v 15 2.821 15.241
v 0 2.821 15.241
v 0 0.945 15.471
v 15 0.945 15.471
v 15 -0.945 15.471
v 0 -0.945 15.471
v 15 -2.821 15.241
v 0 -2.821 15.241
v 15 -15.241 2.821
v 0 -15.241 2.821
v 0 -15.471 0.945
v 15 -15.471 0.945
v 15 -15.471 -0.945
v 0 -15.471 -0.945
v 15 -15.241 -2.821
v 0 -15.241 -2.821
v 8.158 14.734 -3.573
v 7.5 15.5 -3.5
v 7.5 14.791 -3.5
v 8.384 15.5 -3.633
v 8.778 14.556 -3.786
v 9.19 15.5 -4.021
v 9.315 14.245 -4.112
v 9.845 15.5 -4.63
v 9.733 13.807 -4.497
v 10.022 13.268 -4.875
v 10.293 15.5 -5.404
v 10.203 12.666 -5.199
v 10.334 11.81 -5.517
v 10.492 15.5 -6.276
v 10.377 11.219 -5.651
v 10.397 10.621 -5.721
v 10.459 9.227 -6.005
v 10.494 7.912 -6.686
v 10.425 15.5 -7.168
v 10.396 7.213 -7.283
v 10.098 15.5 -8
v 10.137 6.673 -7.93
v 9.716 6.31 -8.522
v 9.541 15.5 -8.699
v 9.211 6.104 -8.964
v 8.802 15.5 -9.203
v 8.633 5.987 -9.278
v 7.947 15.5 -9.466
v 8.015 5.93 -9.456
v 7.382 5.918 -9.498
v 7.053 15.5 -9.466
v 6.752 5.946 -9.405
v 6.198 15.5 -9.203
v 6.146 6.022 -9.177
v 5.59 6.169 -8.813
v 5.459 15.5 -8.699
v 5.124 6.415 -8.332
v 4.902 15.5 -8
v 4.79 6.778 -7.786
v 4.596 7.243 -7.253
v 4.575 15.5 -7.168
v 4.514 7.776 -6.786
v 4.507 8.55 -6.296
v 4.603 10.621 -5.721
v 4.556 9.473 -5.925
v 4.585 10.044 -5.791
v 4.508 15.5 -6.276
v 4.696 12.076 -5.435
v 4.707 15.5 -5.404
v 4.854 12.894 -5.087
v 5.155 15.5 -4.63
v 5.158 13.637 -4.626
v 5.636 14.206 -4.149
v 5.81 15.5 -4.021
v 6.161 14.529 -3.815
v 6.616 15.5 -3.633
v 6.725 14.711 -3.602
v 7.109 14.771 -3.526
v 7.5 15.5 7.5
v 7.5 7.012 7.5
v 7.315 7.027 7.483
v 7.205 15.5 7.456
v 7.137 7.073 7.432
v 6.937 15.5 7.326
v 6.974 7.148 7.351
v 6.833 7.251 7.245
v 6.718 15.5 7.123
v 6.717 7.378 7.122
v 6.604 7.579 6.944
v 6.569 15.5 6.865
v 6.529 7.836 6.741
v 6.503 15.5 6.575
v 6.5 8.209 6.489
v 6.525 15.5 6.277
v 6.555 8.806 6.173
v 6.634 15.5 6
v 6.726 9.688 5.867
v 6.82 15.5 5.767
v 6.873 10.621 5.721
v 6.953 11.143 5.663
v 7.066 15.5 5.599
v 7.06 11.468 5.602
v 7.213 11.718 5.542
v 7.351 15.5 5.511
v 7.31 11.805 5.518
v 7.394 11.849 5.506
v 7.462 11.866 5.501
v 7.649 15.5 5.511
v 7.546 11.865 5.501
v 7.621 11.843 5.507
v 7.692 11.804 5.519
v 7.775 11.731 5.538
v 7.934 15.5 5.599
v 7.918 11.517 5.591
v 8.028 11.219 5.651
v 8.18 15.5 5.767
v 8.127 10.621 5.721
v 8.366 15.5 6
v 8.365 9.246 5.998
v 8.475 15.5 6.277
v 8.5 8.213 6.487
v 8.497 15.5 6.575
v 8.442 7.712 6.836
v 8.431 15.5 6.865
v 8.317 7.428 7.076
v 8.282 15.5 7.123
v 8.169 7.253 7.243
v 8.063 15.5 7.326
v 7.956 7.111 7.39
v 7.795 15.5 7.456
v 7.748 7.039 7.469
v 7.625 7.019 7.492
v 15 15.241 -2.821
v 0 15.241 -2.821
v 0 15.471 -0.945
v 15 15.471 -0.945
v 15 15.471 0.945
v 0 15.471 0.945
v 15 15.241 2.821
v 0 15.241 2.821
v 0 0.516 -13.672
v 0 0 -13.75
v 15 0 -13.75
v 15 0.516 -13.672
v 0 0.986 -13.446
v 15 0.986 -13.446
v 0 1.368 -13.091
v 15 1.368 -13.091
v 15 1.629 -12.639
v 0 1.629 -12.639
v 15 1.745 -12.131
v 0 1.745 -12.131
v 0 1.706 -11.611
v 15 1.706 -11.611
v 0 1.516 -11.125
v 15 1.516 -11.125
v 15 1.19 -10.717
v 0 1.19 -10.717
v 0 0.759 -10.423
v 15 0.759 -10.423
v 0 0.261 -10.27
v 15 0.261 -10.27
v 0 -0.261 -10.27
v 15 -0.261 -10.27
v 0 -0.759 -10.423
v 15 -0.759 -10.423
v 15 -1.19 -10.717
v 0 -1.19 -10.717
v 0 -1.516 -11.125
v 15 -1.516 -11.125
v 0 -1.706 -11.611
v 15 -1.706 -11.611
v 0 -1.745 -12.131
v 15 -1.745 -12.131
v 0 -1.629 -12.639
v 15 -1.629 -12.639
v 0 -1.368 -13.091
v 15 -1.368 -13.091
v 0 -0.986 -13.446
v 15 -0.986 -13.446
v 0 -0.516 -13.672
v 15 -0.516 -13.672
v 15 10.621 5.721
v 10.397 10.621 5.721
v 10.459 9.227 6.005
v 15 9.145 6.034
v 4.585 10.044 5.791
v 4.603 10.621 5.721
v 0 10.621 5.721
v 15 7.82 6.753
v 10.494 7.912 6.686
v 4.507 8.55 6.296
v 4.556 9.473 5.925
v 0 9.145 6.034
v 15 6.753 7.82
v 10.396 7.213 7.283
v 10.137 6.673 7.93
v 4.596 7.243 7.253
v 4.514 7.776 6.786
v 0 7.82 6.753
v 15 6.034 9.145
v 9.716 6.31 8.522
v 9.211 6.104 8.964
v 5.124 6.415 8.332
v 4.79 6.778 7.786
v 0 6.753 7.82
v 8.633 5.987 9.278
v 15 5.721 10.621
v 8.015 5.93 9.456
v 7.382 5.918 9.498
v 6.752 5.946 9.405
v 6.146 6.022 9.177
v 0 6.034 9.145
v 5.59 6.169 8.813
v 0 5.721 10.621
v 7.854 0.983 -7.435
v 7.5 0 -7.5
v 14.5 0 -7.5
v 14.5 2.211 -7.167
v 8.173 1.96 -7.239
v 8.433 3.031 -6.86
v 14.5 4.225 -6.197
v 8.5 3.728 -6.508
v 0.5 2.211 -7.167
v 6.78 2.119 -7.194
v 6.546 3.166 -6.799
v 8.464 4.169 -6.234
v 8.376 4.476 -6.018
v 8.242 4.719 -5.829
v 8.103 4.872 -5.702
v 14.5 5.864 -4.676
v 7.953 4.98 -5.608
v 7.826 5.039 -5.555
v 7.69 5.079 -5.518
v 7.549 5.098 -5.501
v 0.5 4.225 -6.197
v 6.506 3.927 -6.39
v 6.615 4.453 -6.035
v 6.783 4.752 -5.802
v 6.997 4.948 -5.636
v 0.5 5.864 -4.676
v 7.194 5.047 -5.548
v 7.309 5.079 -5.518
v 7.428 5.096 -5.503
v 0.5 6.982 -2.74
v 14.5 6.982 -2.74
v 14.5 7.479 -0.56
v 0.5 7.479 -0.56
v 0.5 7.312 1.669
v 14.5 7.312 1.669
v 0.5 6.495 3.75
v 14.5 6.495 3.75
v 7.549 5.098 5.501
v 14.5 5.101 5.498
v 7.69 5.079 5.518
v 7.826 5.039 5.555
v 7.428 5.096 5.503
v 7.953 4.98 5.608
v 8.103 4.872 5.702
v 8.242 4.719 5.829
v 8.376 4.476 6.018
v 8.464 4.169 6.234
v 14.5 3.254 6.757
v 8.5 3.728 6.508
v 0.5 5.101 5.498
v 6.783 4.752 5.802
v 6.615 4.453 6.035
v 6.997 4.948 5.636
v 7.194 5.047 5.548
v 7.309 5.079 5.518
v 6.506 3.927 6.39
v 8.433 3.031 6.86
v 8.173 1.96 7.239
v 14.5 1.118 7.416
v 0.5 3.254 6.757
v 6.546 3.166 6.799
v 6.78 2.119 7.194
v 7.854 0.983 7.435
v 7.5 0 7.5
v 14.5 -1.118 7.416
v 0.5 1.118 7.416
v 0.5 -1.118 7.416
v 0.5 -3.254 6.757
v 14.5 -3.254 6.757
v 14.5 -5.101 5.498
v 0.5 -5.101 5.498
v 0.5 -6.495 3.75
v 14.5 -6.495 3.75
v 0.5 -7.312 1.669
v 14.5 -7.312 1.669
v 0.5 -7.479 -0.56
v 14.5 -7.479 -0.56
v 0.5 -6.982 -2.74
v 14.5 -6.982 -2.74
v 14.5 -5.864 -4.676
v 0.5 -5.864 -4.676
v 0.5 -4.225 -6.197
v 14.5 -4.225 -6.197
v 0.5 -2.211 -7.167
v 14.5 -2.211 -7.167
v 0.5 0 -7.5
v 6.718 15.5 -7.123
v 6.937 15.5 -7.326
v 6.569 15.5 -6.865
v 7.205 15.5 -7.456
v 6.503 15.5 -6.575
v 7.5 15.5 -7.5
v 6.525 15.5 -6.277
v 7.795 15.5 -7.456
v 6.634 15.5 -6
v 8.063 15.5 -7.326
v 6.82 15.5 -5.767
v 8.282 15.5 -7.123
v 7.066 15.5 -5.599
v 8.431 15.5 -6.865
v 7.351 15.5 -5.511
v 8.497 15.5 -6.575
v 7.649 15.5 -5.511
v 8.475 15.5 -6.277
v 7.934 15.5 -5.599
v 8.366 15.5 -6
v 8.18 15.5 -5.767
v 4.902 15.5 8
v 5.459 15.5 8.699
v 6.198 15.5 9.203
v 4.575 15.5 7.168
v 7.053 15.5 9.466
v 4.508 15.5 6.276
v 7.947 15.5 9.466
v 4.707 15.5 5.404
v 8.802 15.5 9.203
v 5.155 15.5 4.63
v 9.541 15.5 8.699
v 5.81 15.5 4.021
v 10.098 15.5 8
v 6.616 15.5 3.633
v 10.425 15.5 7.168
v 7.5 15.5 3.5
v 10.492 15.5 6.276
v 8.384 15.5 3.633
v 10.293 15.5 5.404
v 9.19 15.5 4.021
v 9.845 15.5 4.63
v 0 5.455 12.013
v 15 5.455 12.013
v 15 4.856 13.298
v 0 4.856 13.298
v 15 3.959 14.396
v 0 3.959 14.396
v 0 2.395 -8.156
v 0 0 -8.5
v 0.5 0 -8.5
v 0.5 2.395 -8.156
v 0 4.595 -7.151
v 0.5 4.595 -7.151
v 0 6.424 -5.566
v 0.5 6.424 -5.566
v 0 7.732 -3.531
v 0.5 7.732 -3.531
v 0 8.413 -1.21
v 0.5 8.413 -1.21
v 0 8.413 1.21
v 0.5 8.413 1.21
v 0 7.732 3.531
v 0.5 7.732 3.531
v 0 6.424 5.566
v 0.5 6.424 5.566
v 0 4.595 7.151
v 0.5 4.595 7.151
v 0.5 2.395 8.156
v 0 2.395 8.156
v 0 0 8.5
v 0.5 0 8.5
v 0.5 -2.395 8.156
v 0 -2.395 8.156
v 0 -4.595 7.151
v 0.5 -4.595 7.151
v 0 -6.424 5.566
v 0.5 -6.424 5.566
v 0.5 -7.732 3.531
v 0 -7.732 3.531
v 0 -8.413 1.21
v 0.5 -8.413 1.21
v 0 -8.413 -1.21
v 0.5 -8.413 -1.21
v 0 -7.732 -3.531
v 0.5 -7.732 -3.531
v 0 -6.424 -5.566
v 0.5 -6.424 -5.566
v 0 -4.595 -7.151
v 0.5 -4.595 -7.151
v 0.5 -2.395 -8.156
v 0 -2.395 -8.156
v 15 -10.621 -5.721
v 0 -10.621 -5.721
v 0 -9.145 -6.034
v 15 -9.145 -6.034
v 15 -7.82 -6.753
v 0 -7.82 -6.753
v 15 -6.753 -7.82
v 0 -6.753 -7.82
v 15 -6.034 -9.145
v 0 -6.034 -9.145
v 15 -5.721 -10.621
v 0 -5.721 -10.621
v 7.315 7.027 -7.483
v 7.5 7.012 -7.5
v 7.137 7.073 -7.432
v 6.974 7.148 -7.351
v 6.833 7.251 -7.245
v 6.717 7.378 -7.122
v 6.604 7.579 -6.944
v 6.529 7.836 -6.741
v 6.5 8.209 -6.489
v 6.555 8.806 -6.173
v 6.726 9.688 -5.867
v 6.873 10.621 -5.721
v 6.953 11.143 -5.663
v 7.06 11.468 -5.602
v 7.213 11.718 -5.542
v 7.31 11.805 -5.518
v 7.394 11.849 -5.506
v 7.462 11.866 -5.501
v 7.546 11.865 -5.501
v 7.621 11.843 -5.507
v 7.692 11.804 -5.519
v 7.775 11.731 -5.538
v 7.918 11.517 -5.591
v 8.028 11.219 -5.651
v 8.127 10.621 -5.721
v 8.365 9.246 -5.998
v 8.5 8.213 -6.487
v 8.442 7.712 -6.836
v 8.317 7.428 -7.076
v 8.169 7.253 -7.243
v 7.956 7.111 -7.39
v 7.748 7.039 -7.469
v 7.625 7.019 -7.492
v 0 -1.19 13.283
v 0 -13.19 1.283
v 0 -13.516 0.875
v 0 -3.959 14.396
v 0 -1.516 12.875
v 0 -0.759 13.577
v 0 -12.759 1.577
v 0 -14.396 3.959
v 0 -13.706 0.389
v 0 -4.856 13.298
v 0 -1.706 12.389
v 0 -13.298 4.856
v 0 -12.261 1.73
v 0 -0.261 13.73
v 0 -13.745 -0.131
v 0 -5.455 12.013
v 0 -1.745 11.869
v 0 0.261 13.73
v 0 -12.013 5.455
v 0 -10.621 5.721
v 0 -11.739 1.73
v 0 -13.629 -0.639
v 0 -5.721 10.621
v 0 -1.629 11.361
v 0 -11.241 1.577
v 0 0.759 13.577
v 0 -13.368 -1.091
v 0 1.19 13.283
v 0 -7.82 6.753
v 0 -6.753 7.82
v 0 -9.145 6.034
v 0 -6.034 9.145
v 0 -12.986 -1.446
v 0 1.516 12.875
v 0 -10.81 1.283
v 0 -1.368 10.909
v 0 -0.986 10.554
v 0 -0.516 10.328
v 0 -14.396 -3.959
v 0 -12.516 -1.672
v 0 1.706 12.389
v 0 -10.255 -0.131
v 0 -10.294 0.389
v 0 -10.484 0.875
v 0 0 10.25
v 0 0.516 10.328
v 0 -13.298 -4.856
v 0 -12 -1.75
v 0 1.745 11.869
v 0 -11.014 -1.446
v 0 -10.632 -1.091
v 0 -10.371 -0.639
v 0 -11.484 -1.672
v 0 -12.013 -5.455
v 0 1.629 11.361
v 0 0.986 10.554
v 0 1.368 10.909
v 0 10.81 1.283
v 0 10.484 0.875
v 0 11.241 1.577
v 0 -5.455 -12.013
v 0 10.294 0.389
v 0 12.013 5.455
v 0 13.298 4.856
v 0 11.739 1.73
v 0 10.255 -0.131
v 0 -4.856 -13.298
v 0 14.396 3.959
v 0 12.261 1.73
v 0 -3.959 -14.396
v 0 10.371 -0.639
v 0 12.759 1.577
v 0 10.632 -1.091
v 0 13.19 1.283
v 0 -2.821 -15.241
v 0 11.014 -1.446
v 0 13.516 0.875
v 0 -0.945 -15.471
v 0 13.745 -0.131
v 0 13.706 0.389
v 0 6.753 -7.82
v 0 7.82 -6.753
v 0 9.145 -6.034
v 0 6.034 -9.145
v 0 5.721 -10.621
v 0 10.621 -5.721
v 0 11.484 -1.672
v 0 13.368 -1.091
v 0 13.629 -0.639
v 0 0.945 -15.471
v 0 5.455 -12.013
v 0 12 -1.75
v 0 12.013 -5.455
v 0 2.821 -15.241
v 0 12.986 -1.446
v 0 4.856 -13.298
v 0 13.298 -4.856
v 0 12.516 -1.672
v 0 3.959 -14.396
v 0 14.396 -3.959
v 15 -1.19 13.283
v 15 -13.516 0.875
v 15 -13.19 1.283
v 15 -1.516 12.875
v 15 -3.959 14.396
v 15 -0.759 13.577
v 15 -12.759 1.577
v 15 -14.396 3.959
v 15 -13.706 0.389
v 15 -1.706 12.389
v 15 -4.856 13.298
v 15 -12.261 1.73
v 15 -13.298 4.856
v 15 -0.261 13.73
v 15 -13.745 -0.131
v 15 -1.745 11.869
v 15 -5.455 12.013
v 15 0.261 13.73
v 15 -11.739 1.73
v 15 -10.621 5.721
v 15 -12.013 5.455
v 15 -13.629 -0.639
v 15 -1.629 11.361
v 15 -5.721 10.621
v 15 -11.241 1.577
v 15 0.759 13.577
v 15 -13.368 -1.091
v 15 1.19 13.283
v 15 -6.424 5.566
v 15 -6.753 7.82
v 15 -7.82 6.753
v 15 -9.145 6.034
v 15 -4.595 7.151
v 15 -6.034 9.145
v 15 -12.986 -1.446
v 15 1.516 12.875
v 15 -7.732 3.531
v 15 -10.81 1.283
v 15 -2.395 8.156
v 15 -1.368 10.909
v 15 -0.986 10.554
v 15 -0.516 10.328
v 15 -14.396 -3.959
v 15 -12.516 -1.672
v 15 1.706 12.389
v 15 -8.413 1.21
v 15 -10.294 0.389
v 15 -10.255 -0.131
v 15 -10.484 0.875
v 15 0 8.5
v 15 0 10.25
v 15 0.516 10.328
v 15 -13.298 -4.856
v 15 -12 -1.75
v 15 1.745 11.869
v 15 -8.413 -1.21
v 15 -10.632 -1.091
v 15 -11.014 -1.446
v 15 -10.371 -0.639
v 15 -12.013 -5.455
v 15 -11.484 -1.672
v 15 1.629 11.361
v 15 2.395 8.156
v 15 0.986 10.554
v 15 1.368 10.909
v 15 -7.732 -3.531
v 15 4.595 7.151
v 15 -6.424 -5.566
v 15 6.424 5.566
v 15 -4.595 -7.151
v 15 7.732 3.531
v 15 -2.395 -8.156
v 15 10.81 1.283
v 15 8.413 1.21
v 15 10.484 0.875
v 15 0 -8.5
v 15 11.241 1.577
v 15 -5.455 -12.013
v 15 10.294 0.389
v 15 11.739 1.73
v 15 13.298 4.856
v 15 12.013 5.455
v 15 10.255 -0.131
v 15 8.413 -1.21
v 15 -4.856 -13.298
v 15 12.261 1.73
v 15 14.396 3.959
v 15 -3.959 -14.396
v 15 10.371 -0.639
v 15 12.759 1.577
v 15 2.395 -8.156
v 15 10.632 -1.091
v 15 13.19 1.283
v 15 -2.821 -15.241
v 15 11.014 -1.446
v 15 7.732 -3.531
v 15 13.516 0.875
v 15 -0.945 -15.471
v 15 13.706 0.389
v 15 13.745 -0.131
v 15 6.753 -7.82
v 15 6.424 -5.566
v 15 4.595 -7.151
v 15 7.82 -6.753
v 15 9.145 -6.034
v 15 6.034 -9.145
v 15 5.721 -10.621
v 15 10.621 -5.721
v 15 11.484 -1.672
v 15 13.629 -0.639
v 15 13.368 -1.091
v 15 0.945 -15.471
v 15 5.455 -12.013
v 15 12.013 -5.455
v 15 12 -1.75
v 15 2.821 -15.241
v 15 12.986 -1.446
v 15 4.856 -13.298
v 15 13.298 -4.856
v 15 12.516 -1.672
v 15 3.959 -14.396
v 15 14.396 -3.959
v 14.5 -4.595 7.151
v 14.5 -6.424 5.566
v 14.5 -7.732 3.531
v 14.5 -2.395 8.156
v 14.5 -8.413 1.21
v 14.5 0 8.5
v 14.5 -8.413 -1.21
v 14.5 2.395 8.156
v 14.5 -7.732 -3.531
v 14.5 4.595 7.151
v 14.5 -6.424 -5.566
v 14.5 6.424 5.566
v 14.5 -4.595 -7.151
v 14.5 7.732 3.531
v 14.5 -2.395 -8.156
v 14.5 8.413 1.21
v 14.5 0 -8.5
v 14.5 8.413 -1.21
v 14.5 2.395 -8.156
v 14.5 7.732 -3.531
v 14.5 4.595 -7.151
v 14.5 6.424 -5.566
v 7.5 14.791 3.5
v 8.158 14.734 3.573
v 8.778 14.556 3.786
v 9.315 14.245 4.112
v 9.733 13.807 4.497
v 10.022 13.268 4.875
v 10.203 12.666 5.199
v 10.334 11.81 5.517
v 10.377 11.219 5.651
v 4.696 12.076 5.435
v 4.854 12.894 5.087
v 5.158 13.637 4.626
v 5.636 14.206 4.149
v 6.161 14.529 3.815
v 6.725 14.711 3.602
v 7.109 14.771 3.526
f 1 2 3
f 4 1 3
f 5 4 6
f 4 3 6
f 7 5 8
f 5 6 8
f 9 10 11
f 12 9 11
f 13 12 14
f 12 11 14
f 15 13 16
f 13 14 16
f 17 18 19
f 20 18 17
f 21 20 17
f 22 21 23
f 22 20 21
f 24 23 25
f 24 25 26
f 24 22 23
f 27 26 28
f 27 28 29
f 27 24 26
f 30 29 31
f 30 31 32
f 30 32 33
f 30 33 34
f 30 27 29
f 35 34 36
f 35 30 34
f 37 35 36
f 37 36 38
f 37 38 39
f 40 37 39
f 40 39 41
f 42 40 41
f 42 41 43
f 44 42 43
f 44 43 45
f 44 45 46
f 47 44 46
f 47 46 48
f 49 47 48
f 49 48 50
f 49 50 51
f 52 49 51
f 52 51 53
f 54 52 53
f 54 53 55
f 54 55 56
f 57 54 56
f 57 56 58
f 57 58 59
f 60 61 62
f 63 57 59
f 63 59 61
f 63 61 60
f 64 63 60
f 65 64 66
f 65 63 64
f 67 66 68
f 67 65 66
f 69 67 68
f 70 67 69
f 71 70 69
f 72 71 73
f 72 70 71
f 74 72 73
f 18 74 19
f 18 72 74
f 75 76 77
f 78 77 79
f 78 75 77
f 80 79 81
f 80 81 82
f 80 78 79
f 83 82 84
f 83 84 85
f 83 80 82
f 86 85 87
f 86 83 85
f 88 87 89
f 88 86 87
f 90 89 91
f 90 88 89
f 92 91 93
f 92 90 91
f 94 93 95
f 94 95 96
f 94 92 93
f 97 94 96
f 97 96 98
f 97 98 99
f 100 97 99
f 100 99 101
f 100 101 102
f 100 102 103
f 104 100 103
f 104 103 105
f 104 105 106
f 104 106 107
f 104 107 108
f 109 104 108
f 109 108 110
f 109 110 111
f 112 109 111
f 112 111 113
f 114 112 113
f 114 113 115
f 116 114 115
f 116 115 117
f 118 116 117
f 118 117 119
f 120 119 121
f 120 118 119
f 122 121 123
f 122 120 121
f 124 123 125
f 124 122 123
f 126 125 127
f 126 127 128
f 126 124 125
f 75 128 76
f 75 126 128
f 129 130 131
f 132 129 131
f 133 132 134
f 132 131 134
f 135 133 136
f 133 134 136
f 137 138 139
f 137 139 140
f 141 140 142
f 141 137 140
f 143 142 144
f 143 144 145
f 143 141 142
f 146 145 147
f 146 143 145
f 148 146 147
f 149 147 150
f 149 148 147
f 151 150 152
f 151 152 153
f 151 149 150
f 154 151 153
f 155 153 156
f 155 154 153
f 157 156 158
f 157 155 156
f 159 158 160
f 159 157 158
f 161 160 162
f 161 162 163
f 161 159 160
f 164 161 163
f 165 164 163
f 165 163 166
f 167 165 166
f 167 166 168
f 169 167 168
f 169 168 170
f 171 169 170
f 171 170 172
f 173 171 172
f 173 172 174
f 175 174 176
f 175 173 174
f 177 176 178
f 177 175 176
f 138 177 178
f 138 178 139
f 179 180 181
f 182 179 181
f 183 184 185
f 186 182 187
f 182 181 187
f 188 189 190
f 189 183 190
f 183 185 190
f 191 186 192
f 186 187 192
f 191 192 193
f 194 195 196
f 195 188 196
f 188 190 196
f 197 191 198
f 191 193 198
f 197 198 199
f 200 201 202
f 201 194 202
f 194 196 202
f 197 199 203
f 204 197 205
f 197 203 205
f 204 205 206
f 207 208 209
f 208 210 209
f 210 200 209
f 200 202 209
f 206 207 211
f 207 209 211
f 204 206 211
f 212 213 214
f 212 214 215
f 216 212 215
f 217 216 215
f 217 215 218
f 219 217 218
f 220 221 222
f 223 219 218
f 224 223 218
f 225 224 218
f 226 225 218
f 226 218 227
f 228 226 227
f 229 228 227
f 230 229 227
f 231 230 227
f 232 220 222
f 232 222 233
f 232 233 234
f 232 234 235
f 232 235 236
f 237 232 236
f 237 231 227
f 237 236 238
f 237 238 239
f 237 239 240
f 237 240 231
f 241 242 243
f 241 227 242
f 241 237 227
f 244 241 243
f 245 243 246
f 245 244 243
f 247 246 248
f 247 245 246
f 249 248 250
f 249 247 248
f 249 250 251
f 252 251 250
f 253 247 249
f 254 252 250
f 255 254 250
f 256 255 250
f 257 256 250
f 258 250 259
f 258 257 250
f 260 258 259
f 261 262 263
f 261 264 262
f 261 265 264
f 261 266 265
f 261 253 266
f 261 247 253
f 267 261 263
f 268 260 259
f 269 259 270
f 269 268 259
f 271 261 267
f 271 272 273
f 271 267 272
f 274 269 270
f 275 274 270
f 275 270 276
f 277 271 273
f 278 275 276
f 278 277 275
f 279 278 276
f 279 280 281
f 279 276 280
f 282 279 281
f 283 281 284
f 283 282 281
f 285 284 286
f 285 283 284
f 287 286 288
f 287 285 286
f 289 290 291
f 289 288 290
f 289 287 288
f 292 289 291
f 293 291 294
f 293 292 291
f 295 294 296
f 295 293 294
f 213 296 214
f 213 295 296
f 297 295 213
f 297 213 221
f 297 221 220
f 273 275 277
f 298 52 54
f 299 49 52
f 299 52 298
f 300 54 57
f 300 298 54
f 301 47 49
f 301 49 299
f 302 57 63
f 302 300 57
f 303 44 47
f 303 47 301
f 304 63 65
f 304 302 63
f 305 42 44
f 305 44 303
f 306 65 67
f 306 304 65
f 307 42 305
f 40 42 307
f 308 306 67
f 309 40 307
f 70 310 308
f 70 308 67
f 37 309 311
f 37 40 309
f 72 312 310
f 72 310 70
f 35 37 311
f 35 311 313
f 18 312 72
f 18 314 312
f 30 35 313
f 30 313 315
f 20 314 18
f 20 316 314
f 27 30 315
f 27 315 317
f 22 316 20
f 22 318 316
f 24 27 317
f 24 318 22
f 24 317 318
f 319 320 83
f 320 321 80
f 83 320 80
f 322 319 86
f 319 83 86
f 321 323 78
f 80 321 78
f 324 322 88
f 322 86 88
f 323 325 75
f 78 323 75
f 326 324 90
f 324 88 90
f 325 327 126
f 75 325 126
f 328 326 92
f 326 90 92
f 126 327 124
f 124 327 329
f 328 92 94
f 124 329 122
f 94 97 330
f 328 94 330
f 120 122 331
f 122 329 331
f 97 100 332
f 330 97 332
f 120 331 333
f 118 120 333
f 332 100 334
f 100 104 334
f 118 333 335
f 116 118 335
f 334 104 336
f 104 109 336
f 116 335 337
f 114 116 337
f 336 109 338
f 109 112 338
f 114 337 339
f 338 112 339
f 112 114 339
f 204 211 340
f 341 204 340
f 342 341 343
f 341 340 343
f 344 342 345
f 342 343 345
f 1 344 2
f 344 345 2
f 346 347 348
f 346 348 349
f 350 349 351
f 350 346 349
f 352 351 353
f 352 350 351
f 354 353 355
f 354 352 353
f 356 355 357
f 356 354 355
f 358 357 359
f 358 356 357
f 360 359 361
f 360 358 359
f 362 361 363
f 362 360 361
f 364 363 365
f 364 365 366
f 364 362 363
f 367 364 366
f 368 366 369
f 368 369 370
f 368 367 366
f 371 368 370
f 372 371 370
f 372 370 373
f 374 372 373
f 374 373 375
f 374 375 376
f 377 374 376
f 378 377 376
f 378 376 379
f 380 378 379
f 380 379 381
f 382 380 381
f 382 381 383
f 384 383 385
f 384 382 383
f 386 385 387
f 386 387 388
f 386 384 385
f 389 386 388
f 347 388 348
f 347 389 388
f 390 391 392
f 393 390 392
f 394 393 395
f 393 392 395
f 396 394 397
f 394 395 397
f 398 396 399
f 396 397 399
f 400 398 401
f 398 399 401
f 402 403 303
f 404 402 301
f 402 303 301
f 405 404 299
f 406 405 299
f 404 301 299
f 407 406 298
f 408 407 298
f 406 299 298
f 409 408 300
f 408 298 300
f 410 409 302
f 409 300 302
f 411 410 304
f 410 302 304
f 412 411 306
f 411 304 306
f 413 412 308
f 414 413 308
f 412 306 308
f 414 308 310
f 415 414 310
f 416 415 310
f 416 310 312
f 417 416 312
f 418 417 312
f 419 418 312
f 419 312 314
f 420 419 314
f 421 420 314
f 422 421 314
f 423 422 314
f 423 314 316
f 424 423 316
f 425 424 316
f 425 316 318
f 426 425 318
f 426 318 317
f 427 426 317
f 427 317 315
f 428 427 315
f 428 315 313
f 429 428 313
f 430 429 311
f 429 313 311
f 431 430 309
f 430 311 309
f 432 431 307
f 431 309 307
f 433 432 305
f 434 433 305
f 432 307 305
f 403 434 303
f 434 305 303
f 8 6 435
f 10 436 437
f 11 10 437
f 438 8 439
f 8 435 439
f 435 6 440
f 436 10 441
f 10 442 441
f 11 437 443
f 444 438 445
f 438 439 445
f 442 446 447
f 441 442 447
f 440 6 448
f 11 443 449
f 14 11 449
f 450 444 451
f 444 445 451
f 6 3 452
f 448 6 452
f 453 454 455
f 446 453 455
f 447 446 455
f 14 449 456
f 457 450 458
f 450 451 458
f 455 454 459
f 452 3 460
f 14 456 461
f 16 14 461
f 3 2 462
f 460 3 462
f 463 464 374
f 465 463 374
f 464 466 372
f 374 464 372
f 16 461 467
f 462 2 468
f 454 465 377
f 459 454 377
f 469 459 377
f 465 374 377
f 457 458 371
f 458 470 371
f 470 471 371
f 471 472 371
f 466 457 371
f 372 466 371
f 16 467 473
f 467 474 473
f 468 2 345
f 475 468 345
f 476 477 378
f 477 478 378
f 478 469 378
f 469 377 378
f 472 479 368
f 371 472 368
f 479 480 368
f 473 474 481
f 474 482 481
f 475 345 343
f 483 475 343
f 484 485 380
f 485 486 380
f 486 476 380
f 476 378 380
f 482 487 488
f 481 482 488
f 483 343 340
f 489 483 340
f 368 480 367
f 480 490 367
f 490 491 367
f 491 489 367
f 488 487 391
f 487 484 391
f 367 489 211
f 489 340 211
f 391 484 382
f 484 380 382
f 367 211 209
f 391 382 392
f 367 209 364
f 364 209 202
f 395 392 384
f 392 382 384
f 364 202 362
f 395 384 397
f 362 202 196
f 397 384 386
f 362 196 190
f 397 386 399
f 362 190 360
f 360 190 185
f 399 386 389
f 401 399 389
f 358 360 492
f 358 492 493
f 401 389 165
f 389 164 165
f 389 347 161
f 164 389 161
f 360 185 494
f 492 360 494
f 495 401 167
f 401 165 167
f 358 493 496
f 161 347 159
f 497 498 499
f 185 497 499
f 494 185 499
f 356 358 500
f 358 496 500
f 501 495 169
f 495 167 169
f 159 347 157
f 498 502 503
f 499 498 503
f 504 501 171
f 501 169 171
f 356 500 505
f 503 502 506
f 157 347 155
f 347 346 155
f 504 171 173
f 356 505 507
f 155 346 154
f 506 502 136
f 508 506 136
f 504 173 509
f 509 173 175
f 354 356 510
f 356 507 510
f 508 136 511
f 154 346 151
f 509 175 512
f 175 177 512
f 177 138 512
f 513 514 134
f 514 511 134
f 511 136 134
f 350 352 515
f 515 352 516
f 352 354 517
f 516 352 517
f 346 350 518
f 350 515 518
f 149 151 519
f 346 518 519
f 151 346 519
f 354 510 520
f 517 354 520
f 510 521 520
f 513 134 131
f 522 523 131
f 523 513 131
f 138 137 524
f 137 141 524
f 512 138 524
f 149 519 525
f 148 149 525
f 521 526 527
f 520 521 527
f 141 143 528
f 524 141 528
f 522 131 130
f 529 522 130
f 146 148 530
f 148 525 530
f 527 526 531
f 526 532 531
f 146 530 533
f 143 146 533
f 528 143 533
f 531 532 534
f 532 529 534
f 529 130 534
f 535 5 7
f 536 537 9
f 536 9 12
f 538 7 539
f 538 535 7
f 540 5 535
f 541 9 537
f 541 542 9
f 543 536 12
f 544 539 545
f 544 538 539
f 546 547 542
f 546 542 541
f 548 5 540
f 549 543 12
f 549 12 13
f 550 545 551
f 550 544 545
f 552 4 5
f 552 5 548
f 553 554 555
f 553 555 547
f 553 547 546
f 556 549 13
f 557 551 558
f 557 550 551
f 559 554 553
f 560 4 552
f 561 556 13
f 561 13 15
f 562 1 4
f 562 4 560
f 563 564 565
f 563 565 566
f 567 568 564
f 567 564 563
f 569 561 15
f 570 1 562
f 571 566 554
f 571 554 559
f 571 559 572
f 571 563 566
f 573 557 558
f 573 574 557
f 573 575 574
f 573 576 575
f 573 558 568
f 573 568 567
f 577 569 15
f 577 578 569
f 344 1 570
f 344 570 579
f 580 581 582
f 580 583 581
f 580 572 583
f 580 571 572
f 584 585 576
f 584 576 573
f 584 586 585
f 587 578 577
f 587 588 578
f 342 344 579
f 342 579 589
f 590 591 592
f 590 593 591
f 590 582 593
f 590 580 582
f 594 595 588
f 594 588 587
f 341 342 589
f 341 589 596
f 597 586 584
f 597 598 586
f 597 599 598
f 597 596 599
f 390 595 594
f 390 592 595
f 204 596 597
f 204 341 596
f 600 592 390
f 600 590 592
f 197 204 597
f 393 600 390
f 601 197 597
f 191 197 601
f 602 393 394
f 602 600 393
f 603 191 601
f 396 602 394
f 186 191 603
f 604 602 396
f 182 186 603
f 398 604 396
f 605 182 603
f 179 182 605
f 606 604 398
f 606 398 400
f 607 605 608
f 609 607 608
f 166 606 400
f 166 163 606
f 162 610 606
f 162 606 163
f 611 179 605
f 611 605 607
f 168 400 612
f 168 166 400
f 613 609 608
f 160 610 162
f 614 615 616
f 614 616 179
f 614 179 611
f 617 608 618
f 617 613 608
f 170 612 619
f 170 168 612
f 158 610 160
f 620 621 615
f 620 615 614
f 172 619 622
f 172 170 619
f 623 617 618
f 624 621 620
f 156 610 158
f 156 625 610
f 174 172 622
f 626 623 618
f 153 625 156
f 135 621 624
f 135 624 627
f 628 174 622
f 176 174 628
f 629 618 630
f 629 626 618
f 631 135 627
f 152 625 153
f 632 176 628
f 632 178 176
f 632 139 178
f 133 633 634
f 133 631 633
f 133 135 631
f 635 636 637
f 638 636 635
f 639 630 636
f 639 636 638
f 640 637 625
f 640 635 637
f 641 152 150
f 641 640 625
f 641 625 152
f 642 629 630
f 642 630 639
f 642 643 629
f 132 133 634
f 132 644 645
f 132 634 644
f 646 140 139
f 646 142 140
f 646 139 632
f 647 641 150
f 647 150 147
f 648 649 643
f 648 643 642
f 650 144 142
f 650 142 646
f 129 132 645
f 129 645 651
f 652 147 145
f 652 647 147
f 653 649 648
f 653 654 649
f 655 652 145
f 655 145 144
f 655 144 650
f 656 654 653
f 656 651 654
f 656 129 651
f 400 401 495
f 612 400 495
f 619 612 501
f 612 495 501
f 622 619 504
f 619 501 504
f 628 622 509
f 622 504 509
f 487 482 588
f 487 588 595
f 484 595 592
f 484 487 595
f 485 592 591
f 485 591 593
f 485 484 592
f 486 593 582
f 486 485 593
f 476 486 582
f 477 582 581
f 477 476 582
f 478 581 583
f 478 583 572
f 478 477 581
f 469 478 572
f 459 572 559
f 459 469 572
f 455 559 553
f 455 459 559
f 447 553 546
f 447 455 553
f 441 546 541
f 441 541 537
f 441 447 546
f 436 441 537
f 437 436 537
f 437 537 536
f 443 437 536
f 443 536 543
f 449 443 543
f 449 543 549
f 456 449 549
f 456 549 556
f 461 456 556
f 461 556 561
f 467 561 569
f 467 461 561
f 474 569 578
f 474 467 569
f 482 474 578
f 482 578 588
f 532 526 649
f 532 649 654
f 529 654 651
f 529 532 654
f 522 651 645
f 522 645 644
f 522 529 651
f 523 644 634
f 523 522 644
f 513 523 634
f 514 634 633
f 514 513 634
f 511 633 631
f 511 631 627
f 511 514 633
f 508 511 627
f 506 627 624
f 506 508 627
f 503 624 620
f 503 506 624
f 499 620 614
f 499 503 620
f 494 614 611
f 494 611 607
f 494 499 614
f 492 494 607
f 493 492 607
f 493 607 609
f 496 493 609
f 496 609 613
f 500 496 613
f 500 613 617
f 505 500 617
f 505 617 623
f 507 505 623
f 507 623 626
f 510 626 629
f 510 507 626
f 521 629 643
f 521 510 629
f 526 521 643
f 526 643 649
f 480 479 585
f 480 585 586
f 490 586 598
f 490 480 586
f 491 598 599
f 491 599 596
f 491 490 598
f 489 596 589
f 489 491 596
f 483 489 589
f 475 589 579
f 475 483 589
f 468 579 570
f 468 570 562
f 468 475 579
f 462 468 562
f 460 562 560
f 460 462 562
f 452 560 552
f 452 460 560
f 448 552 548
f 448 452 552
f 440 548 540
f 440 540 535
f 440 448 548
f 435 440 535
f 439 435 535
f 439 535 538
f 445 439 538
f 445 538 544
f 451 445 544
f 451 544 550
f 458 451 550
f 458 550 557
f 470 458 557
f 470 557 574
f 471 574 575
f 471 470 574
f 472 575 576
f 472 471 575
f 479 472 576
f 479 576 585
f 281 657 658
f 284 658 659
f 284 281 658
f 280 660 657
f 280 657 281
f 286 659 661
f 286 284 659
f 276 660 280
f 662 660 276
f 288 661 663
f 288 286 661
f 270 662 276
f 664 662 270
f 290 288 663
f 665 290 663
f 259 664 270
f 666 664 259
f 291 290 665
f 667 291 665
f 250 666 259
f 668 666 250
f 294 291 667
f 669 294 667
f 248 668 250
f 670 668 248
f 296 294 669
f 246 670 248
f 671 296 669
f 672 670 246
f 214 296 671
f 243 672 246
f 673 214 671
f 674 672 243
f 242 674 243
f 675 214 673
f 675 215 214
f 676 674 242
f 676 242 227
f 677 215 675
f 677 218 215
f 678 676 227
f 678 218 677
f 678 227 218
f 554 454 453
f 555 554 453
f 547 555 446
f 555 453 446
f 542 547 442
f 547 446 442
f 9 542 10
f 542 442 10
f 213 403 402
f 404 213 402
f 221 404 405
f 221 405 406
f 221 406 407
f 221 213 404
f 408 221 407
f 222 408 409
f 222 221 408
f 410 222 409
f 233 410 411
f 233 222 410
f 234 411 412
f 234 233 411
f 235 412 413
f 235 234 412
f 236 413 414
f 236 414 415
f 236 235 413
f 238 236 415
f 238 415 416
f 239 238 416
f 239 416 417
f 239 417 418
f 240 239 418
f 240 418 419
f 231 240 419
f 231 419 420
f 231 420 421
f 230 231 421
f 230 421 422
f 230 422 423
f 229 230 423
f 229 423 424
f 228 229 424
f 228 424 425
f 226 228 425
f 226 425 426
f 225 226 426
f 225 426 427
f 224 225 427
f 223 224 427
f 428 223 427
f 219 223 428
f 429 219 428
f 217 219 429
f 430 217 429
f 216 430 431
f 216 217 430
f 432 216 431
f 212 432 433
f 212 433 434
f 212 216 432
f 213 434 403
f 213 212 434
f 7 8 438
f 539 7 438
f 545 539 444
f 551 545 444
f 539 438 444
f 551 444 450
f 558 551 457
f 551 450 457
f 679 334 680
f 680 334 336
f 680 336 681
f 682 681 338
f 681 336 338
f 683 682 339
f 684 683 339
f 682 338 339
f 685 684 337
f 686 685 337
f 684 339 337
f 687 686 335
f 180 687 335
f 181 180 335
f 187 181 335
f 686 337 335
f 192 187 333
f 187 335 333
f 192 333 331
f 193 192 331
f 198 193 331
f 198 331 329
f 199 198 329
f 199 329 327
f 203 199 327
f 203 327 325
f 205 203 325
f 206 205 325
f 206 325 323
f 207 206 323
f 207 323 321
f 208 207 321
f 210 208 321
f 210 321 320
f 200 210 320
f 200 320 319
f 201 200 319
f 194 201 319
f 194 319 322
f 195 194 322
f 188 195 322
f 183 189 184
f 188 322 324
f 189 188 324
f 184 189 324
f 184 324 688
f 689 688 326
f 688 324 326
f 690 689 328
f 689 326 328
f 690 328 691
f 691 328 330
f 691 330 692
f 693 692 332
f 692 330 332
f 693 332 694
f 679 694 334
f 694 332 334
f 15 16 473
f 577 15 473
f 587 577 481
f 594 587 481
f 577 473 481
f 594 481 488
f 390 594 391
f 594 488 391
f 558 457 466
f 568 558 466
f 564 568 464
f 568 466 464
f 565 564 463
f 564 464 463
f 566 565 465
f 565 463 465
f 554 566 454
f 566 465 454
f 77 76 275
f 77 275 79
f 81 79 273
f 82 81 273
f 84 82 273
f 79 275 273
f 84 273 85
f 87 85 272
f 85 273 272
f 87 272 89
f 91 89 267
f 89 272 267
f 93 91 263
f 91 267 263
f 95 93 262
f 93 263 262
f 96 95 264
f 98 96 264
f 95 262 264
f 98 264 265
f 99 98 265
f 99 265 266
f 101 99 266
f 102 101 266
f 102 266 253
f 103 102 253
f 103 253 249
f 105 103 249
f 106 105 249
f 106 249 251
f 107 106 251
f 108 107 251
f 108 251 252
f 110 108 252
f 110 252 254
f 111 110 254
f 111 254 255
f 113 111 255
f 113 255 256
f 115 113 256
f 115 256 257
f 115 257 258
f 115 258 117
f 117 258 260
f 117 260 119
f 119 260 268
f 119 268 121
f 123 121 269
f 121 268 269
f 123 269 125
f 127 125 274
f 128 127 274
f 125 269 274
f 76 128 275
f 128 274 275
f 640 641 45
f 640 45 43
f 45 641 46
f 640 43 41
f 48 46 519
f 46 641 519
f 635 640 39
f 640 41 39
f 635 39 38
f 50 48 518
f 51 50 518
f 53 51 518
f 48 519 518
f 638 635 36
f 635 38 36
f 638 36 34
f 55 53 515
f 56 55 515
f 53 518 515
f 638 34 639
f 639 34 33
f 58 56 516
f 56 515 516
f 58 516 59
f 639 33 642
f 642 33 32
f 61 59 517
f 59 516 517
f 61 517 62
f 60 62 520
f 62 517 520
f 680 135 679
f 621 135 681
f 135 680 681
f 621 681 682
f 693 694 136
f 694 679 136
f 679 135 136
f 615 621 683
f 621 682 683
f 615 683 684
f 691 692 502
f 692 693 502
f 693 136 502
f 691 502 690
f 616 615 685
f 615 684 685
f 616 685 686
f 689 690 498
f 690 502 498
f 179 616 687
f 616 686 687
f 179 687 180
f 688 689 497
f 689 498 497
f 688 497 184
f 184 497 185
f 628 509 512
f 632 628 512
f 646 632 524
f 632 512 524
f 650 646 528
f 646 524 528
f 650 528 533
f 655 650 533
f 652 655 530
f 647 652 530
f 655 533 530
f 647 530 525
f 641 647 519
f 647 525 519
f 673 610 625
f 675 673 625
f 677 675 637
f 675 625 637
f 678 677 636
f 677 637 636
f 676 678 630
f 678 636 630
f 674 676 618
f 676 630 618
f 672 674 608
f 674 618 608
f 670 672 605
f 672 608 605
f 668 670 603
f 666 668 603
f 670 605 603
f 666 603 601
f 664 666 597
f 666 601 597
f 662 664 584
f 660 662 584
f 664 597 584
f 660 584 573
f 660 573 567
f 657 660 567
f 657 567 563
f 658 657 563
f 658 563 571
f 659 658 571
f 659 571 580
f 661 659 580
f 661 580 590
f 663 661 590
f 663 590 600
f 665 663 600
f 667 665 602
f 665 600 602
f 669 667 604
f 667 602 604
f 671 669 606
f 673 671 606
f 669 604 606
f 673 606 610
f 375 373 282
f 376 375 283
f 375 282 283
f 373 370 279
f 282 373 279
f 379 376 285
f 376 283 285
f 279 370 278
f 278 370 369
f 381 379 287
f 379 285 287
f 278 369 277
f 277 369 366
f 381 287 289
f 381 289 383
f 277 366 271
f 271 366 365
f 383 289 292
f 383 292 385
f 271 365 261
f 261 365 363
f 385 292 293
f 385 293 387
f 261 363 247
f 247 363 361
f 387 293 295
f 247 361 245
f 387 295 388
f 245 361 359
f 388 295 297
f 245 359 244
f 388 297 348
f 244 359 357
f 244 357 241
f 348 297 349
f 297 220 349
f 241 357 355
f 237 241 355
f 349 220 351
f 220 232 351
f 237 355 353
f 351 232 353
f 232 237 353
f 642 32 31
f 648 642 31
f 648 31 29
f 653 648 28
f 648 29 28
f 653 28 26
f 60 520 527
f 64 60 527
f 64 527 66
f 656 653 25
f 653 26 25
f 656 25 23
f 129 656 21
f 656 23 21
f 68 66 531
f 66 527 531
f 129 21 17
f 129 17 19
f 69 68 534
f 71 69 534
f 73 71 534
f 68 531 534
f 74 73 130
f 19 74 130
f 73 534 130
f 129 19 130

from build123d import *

# Parameters (mm, degrees)
SKETCH2_R           = 1.75
SKETCH2_R_2         = 7.5
FLANGE_DEPTH        = 15
SKETCH3_R           = 8.5
O_RING_SEAT_DEPTH   = 0.5
SKETCH5_R           = 1
OUTLET_DEPTH        = 27.561249971
BOSS_EXTRUDE2_REACH = 39.766
SKETCH6_R           = 3
SKETCH6_R_2         = 1


with BuildPart() as part:
    # Sketch2 → Flange (new body)
    with BuildSketch(Plane(origin=(0, 0, 0), x_dir=(0, 0, -1), z_dir=(1, 0, 0))):
        with BuildLine():
            ThreePointArc((-15.241152619, 2.820862781), (-15.5, 0), (-15.241152619, -2.820862781))
            ThreePointArc((-15.241152619, -2.820862781), (-13.297993041, -4.855781062), (-10.620697085, -5.721141055))
            ThreePointArc((-10.620697085, -5.721141055), (-7.247844507, -7.247844507), (-5.721141055, -10.620697085))
            ThreePointArc((-5.721141055, -10.620697085), (-4.855781062, -13.297993041), (-2.820862781, -15.241152619))
            ThreePointArc((-2.820862781, -15.241152619), (0, -15.5), (2.820862781, -15.241152619))
            ThreePointArc((2.820862781, -15.241152619), (4.855781062, -13.297993041), (5.721141055, -10.620697085))
            ThreePointArc((5.721141055, -10.620697085), (7.247844507, -7.247844507), (10.620697085, -5.721141055))
            ThreePointArc((10.620697085, -5.721141055), (13.297993041, -4.855781062), (15.241152619, -2.820862781))
            ThreePointArc((15.241152619, -2.820862781), (15.5, 0), (15.241152619, 2.820862781))
            ThreePointArc((15.241152619, 2.820862781), (13.297993041, 4.855781062), (10.620697085, 5.721141055))
            ThreePointArc((10.620697085, 5.721141055), (7.247844507, 7.247844507), (5.721141055, 10.620697085))
            ThreePointArc((5.721141055, 10.620697085), (4.855781062, 13.297993041), (2.820862781, 15.241152619))
            ThreePointArc((2.820862781, 15.241152619), (0, 15.5), (-2.820862781, 15.241152619))
            ThreePointArc((-2.820862781, 15.241152619), (-4.855781062, 13.297993041), (-5.721141055, 10.620697085))
            ThreePointArc((-5.721141055, 10.620697085), (-7.247844507, 7.247844507), (-10.620697085, 5.721141055))
            ThreePointArc((-10.620697085, 5.721141055), (-13.297993041, 4.855781062), (-15.241152619, 2.820862781))
        make_face()
        with Locations((0, 12)):
            Circle(SKETCH2_R, mode=Mode.SUBTRACT)
        with Locations((12, 0)):
            Circle(SKETCH2_R, mode=Mode.SUBTRACT)
        with Locations((0, -12)):
            Circle(SKETCH2_R, mode=Mode.SUBTRACT)
        with Locations((-12, 0)):
            Circle(SKETCH2_R, mode=Mode.SUBTRACT)
        Circle(SKETCH2_R_2, mode=Mode.SUBTRACT)
    extrude(amount=FLANGE_DEPTH)

    # Sketch3 → O-Ring Seat (cut)
    with BuildSketch(Plane(origin=(15, 0, 0), x_dir=(0, 0, -1), z_dir=(1, 0, 0))):
        Circle(SKETCH3_R)
    o_ring_seat = extrude(amount=-O_RING_SEAT_DEPTH, mode=Mode.SUBTRACT)

    # Mirror1: O-Ring Seat across plane
    add(o_ring_seat.mirror(Plane.ZY.offset(-7.5)), mode=Mode.SUBTRACT)

    # Sketch5 → Outlet (cut, through all)
    with BuildSketch(Plane(origin=(0, 0, 0), x_dir=(1, 0, 0), z_dir=(0, 1, 0))):
        with Locations(Location((7.5, 6.5, 0), (0, 0, 90))):
            Circle(SKETCH5_R)
    outlet = extrude(amount=OUTLET_DEPTH, mode=Mode.SUBTRACT)

    # Sketch6 → Boss-Extrude2 (add, up to next)
    with BuildSketch(Plane(origin=(0, 15.5, 0), x_dir=(1, 0, 0), z_dir=(0, 1, 0)), mode=Mode.PRIVATE) as boss_extrude2_sk1:
        with Locations(Location((7.5, 6.5, 0), (0, 0, 270))):
            Circle(SKETCH6_R)
        with Locations(Location((7.5, 6.5, 0), (0, 0, 90))):
            Circle(SKETCH6_R_2, mode=Mode.SUBTRACT)
    boss_extrude2_tool1 = extrude(boss_extrude2_sk1.sketch, amount=-BOSS_EXTRUDE2_REACH, mode=Mode.PRIVATE) - part.part
    boss_extrude2 = boss_extrude2_tool1.solids().sort_by_distance((7.5, 15.5, -9.415147))[0]
    add(boss_extrude2)

    # Inlet: Outlet, Boss-Extrude2 across plane
    add(outlet.mirror(Plane.XY), mode=Mode.SUBTRACT)
    add(boss_extrude2.mirror(Plane.XY))


solid = part.part
